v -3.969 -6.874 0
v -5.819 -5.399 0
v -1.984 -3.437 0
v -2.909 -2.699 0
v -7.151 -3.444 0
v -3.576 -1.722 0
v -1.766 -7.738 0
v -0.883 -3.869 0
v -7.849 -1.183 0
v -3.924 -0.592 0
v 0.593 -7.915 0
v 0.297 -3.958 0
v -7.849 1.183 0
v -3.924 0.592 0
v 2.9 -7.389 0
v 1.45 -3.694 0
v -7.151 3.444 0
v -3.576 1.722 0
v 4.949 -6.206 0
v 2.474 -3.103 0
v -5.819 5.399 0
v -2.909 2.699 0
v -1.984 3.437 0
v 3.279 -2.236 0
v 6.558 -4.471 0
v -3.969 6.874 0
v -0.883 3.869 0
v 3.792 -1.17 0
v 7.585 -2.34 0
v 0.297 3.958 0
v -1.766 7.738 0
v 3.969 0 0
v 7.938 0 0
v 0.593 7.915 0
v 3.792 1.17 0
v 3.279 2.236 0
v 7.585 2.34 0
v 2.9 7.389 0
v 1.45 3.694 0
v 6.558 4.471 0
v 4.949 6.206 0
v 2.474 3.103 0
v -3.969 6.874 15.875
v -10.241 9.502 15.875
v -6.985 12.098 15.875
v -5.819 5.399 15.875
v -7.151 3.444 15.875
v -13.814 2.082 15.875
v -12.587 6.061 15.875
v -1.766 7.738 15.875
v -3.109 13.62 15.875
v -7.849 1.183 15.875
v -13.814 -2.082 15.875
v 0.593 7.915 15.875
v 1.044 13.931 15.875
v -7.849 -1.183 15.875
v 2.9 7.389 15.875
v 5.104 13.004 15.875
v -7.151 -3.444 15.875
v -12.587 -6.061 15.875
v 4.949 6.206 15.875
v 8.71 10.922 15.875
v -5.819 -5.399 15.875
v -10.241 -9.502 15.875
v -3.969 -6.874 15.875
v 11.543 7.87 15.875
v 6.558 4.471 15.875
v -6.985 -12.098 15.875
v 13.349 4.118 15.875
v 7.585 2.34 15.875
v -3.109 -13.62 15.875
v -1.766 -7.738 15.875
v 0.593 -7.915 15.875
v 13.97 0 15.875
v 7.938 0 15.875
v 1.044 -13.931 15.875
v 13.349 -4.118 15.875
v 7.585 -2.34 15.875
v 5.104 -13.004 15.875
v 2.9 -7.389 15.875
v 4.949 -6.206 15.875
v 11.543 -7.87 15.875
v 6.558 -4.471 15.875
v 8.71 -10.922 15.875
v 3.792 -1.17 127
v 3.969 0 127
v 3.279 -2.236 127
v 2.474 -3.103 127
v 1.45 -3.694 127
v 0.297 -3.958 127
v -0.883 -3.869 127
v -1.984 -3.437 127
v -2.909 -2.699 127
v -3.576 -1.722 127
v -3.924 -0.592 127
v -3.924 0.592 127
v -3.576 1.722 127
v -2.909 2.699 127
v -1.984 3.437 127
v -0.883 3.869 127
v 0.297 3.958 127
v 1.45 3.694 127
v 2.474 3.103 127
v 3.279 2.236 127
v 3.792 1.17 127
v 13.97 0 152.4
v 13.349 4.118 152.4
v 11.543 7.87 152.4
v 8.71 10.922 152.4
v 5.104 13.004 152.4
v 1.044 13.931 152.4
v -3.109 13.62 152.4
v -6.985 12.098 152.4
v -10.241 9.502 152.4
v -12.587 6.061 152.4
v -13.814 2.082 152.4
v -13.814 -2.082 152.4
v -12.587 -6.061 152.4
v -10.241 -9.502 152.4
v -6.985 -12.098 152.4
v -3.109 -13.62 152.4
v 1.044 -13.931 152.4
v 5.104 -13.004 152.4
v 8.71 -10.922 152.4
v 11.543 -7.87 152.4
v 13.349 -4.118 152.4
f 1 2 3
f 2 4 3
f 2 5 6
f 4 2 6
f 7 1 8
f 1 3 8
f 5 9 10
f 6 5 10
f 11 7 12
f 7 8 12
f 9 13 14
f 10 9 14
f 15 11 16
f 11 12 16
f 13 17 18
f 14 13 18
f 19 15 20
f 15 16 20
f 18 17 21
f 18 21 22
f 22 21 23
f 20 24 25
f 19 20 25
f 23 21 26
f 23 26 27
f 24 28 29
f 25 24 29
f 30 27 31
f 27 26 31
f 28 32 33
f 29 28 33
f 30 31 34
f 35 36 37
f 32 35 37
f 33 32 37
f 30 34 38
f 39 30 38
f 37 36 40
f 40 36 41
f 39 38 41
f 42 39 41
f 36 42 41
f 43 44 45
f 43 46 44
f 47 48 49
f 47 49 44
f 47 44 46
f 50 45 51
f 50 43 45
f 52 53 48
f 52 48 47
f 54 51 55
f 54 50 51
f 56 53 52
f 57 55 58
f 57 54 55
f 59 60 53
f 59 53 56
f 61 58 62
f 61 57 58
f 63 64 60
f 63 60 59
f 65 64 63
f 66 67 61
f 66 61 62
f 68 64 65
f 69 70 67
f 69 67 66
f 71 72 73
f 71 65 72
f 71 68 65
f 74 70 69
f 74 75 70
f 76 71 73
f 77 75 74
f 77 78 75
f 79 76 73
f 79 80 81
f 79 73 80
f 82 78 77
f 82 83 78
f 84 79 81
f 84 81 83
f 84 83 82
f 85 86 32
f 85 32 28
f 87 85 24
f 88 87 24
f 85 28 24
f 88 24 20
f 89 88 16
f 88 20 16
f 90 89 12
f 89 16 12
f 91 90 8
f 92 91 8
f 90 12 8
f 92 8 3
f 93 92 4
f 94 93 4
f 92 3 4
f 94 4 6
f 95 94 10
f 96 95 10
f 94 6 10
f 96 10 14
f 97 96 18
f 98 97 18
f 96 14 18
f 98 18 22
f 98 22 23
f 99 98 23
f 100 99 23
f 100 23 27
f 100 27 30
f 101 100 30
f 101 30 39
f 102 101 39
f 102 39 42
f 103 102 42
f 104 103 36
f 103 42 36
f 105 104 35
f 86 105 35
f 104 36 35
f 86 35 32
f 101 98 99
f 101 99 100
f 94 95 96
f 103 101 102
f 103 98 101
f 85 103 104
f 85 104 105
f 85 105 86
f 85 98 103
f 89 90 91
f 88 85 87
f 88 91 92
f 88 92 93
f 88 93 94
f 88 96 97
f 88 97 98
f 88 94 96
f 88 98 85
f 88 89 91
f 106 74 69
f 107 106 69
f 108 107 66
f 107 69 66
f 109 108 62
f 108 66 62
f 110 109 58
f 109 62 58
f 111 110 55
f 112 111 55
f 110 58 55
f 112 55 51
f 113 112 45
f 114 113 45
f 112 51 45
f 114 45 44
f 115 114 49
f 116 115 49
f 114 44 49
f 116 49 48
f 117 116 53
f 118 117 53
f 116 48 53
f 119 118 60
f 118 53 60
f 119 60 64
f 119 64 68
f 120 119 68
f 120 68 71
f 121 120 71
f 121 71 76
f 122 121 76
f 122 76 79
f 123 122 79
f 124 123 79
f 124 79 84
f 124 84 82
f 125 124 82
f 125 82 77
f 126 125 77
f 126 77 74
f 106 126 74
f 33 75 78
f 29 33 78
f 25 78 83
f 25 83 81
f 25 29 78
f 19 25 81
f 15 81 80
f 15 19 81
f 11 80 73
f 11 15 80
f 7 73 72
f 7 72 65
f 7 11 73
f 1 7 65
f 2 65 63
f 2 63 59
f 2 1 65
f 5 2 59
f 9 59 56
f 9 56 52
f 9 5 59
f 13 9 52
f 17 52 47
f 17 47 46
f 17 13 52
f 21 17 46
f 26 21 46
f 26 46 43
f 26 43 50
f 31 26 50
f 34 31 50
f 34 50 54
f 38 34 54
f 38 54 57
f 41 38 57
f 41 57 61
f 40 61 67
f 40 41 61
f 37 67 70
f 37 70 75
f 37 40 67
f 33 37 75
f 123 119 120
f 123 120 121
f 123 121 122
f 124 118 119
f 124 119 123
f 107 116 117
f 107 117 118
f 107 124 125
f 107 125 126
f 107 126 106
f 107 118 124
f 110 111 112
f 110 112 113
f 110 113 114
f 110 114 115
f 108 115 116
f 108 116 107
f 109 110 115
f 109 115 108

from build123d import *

# Parameters (mm, degrees)
F0_R     = 13.97
F1_DEPTH = 152.4
F2_R     = 13.97
F2_R_2   = 7.9375
F3_DEPTH = 15.875
F4_R     = 3.96875
F5_DEPTH = 127


with BuildPart() as f1:
    # F0 (on Top) → F1 (new body)
    with BuildSketch(Plane.XY):
        Circle(F0_R)
    extrude(amount=F1_DEPTH)

    # F2 (on face) → F3 (cut)
    with BuildSketch(Plane(origin=(0, 0, 0), x_dir=(1, 0, 0), z_dir=(0, 0, -1))):
        Circle(F2_R)
        Circle(F2_R_2, mode=Mode.SUBTRACT)
    extrude(amount=-F3_DEPTH, mode=Mode.SUBTRACT)

    # F4 (on face) → F5 (cut)
    with BuildSketch(Plane(origin=(0, 0, 0), x_dir=(1, 0, 0), z_dir=(0, 0, -1))):
        Circle(F4_R)
    extrude(amount=-F5_DEPTH, mode=Mode.SUBTRACT)


solid = f1.part
